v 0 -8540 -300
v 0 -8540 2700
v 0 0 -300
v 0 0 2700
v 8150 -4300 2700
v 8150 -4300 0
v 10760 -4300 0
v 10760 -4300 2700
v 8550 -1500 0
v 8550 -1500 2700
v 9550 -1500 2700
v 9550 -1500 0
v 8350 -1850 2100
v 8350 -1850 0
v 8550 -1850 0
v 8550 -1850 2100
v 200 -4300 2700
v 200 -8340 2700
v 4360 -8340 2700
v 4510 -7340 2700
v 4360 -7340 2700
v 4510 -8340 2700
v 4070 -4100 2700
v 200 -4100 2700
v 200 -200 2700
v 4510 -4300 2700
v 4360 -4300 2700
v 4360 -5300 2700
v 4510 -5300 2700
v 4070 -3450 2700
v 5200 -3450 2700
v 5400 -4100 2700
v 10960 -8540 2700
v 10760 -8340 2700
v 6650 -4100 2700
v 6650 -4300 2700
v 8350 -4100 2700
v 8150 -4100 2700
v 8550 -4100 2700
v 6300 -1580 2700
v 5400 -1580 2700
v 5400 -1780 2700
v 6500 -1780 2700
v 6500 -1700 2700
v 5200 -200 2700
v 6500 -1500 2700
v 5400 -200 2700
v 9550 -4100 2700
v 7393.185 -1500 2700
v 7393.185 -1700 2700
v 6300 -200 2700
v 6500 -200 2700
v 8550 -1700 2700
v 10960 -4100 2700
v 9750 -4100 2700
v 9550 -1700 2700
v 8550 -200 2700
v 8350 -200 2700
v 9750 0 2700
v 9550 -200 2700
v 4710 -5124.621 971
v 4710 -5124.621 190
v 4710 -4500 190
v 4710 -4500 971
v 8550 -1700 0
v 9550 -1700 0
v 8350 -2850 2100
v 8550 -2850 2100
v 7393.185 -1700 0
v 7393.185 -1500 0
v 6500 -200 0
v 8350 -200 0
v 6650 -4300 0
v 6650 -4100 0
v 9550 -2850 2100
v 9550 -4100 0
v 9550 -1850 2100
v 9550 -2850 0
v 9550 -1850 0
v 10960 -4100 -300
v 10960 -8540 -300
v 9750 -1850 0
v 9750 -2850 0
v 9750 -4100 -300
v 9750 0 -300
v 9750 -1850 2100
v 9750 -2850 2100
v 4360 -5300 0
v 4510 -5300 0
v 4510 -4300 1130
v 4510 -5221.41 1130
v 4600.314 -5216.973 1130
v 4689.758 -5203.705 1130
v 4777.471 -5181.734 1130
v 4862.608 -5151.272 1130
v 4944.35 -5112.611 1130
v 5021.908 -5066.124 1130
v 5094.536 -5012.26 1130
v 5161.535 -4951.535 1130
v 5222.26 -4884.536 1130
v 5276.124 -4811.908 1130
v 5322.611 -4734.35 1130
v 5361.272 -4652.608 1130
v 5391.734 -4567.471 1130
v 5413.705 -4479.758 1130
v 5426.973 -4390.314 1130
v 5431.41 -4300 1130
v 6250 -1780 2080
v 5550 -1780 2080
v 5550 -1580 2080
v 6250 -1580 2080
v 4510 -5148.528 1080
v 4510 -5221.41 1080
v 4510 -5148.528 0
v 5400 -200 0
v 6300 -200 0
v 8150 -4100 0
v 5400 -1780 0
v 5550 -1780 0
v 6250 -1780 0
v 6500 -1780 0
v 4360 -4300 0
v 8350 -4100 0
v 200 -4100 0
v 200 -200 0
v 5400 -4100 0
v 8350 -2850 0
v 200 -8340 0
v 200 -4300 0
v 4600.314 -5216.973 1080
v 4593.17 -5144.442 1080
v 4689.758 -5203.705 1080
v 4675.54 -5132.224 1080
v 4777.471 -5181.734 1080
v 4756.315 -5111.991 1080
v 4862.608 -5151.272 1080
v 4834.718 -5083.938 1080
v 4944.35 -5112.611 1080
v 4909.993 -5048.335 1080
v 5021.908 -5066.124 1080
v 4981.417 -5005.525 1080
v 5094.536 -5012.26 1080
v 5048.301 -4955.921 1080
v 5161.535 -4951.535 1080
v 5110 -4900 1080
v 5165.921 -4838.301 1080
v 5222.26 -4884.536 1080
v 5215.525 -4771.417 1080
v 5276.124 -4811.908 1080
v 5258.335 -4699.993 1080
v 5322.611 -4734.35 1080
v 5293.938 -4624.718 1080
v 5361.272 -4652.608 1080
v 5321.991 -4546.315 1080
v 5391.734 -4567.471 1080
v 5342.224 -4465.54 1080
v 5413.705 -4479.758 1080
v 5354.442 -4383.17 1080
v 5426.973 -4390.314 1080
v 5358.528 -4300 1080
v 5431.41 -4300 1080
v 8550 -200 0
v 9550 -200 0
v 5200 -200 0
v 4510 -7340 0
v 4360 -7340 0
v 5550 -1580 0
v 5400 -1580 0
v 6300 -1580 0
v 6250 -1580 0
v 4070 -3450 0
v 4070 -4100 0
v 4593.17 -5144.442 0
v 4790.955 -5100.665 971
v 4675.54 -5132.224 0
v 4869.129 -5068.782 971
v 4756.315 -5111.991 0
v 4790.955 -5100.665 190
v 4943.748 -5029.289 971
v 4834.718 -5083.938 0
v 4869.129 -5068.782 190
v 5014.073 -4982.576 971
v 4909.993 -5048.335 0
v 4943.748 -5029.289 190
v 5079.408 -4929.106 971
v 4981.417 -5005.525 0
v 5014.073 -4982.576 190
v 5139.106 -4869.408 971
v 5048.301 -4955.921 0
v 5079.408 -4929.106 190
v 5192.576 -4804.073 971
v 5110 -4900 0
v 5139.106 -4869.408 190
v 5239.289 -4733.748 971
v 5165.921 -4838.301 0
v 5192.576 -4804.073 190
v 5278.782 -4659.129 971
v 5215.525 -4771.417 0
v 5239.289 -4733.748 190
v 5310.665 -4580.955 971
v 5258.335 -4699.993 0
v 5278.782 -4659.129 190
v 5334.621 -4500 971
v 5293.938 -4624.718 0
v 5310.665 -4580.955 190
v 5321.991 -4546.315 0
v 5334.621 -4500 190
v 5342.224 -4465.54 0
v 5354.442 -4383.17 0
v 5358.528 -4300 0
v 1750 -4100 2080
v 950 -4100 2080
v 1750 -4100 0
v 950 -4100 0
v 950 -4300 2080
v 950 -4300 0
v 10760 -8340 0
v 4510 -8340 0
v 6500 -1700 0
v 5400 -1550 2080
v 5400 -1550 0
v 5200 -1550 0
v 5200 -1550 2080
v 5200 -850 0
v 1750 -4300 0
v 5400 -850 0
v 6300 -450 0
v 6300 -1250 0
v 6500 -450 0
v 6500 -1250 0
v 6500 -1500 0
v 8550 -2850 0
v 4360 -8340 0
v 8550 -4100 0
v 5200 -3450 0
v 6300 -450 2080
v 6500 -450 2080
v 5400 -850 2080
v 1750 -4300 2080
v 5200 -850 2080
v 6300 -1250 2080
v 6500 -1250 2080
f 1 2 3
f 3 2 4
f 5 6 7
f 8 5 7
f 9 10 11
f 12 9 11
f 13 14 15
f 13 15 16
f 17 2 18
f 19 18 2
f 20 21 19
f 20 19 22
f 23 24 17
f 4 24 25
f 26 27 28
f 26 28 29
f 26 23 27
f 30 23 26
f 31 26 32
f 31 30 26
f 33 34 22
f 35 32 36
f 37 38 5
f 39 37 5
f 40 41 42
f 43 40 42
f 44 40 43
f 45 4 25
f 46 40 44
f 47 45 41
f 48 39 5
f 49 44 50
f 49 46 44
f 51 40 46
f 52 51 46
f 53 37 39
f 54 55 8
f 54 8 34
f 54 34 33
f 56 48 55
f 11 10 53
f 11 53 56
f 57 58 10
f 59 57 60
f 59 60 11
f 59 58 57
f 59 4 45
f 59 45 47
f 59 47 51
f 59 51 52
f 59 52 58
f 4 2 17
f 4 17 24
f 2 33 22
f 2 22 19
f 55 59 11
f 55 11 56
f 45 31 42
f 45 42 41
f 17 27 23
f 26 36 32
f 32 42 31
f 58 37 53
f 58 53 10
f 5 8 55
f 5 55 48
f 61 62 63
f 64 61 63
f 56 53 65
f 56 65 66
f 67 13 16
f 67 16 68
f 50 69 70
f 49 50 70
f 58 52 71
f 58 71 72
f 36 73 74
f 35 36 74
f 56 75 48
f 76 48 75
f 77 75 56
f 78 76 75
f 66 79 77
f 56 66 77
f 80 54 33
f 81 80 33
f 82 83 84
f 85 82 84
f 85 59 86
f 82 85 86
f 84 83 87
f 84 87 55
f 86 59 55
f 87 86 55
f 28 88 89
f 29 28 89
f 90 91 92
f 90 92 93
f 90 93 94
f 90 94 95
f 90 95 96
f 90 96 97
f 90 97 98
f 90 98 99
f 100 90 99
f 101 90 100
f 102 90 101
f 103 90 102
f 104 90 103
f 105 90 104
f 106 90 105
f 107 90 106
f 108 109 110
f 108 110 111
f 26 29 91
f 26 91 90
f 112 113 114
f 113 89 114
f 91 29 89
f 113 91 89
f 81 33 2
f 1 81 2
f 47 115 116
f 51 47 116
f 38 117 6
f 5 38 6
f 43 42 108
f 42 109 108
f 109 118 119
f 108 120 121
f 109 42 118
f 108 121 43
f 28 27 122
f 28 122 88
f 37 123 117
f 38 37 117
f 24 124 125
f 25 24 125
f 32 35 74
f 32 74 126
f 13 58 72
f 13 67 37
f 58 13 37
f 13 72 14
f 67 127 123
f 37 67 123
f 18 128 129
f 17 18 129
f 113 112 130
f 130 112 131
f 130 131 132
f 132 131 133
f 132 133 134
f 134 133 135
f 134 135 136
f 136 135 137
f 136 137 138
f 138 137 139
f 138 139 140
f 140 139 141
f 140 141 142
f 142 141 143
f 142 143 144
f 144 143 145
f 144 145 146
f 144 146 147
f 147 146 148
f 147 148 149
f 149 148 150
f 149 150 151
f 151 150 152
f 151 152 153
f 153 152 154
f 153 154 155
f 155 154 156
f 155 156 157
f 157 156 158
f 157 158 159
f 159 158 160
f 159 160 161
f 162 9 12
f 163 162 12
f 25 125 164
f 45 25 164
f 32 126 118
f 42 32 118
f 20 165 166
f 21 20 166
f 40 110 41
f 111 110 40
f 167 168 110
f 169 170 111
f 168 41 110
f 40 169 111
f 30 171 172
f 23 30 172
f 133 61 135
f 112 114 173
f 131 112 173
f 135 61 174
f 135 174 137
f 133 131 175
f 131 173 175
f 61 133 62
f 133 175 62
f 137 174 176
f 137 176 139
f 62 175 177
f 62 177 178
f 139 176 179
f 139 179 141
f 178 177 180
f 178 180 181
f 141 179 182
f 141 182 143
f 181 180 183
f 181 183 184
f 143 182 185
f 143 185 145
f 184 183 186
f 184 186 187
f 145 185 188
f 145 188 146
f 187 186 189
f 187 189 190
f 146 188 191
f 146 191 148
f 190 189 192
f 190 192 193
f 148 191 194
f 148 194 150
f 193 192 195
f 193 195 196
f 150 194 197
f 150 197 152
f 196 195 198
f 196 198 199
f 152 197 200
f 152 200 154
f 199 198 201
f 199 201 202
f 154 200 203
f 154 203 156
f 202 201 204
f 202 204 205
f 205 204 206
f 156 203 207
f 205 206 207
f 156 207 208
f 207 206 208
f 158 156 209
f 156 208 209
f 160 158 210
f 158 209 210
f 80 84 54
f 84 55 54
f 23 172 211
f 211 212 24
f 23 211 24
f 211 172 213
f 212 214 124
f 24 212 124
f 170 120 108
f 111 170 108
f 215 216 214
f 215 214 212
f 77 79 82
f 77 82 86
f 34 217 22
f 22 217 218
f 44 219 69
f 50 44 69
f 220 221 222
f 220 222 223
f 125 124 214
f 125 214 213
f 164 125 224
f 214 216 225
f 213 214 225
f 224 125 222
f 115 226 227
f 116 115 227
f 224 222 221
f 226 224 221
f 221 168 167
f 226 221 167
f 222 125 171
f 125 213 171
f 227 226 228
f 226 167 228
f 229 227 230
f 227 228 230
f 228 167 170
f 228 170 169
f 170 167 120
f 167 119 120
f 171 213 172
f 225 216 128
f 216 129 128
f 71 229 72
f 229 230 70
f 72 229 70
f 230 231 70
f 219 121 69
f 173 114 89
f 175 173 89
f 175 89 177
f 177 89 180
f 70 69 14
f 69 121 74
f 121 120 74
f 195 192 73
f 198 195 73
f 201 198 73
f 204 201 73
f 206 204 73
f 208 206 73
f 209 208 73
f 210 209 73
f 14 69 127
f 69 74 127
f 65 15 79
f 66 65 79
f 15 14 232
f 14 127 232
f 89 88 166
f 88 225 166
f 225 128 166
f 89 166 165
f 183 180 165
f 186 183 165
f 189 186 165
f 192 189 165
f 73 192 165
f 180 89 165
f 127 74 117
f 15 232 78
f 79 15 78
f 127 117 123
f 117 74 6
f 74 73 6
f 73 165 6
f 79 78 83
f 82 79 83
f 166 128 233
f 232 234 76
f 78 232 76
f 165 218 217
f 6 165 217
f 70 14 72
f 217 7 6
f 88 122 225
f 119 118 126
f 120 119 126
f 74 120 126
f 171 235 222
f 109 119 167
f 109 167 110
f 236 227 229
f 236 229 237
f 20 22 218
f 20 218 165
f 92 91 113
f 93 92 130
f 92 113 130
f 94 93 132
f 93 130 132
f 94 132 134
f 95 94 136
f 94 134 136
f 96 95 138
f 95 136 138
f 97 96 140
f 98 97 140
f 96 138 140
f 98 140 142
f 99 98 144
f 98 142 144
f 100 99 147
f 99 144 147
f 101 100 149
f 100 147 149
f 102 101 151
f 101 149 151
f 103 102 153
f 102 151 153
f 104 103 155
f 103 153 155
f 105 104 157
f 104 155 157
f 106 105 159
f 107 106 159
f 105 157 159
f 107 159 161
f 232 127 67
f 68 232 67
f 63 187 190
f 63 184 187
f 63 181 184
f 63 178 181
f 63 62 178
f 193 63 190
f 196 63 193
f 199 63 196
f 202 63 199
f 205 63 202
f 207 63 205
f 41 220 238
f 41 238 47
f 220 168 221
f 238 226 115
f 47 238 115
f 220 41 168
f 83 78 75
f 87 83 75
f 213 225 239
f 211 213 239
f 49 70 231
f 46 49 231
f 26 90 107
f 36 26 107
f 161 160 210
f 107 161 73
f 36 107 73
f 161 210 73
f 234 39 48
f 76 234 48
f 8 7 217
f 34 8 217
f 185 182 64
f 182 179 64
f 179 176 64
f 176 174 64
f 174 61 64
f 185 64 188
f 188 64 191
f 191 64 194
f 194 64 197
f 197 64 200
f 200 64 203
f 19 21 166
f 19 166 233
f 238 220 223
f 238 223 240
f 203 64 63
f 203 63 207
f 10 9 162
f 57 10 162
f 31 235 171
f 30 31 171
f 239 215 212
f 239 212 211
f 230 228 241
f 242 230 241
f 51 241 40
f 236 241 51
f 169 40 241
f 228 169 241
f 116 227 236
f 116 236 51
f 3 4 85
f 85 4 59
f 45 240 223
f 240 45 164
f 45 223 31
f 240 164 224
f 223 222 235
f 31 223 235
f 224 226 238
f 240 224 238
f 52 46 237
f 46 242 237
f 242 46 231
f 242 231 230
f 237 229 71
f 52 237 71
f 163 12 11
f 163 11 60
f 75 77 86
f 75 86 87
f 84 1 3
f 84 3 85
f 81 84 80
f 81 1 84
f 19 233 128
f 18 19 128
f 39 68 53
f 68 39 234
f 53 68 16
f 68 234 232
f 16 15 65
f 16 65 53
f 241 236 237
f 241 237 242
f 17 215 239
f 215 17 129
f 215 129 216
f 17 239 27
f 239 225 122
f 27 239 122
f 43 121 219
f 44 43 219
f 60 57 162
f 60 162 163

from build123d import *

# Parameters (mm, degrees)
F0_W      = 1000
F0_H      = 2400
F0_W_2    = 900
F0_H_2    = 1380
F0_H_3    = 1300
F1_DEPTH  = 2700
F3_DEPTH  = 300
F4_W      = 700
F4_H      = 2080
F5_DEPTH  = 200
F6_W      = 700
F6_H      = 2080
F7_DEPTH  = 200
F8_W      = 800
F8_H      = 2080
F9_DEPTH  = 200
F11_DEPTH = 1080
F13_DEPTH = 50
F15_START = -159
F14_W     = 1265.3409564789
F14_H     = 990.9356449679
F15_DEPTH = 781
F16_W     = 1000
F16_H     = 2100
F17_DEPTH = 1400
F18_W     = 800
F18_H     = 2080
F19_DEPTH = 200


with BuildPart() as f1:
    # F0 (on Top) → F1 (new body)
    with BuildSketch(Plane.XY):
        Polygon((9750, 0), (0, 0), (0, -8540), (10960, -8540), (10960, -4100), (9750, -4100), align=None)
        Polygon((200, -4100), (200, -200), (5200, -200), (5200, -3450), (4070, -3450), (4070, -4100), align=None, mode=Mode.SUBTRACT)
        Polygon((200, -8340), (200, -4300), (4360, -4300), (4360, -5300), (4510, -5300), (4510, -4300), (6650, -4300), (6650, -4100), (5400, -4100), (5400, -1780), (6500, -1780), (6500, -1700), (7393.1846618652, -1700), (7393.1846618652, -1500), (6500, -1500), (6500, -200), (8350, -200), (8350, -1700), (8350, -4100), (8150, -4100), (8150, -4300), (10760, -4300), (10760, -8340), (4510, -8340), (4510, -7340), (4360, -7340), (4360, -8340), align=None, mode=Mode.SUBTRACT)
        with Locations((9050, -2900)):
            Rectangle(F0_W, F0_H, mode=Mode.SUBTRACT)
        with Locations((5850, -890)):
            Rectangle(F0_W_2, F0_H_2, mode=Mode.SUBTRACT)
        with Locations((9050, -850)):
            Rectangle(F0_W, F0_H_3, mode=Mode.SUBTRACT)
    extrude(amount=F1_DEPTH)

    # F2 (on face) → F3 (join)
    with BuildSketch(Plane(origin=(0, 0, 0), x_dir=(1, 0, 0), z_dir=(0, 0, -1))):
        Polygon((0, 8540), (0, 0), (9750, 0), (9750, 4100), (10960, 4100), (10960, 8540), align=None)
    extrude(amount=F3_DEPTH)

    # F4 (on face) → F5 (cut, through all)
    with BuildSketch(Plane.XZ.offset(1780)):
        with Locations((5900, 1040)):
            Rectangle(F4_W, F4_H)
    extrude(amount=-F5_DEPTH, mode=Mode.SUBTRACT)

    # F6 (on face) → F7 (cut, through all)
    with BuildSketch(Plane.YZ.offset(5400)):
        with Locations((-1200, 1040)):
            Rectangle(F6_W, F6_H)
    extrude(amount=-F7_DEPTH, mode=Mode.SUBTRACT)

    # F8 (on face) → F9 (cut, through all)
    with BuildSketch(Plane(origin=(6300, 0, 0), x_dir=(0, -1, 0), z_dir=(-1, 0, 0))):
        with Locations((850, 1040)):
            Rectangle(F8_W, F8_H)
    extrude(amount=-F9_DEPTH, mode=Mode.SUBTRACT)

    # F10 (on face) → F11 (join)
    with BuildSketch(Plane.XY):
        with BuildLine():
            Line((5358.5281374239, -4300), (4510, -4300))
            Line((4510, -4300), (4510, -5148.5281374239))
            ThreePointArc((4510, -5148.5281374239), (5110, -4900), (5358.5281374239, -4300))
        make_face()
    extrude(amount=F11_DEPTH)

    # F12 (on face) → F13 (join)
    with BuildSketch(Plane.XY.offset(1080)):
        with BuildLine():
            Line((4510, -4300), (4510, -5221.4100177281))
            ThreePointArc((4510, -5221.4100177281), (5161.5352717887, -4951.5352717887), (5431.4100177281, -4300))
            Line((5431.4100177281, -4300), (4510, -4300))
        make_face()
    extrude(amount=F13_DEPTH)

    # F14 (on face) → F15 (cut)
    with BuildSketch(Plane.XY.offset(1130).offset(F15_START)):
        with Locations((5342.6704782395, -4995.4678224839)):
            Rectangle(F14_W, F14_H)
    extrude(amount=-F15_DEPTH, mode=Mode.SUBTRACT)

    # F16 (on face) → F17 (cut, through all)
    with BuildSketch(Plane(origin=(8350, 0, 0), x_dir=(0, -1, 0), z_dir=(-1, 0, 0))):
        with Locations((2350, 1050)):
            Rectangle(F16_W, F16_H)
    extrude(amount=-F17_DEPTH, mode=Mode.SUBTRACT)

    # F18 (on face) → F19 (cut, through all)
    with BuildSketch(Plane.XZ.offset(4300)):
        with Locations((1350, 1040)):
            Rectangle(F18_W, F18_H)
    extrude(amount=-F19_DEPTH, mode=Mode.SUBTRACT)


solid = f1.part
